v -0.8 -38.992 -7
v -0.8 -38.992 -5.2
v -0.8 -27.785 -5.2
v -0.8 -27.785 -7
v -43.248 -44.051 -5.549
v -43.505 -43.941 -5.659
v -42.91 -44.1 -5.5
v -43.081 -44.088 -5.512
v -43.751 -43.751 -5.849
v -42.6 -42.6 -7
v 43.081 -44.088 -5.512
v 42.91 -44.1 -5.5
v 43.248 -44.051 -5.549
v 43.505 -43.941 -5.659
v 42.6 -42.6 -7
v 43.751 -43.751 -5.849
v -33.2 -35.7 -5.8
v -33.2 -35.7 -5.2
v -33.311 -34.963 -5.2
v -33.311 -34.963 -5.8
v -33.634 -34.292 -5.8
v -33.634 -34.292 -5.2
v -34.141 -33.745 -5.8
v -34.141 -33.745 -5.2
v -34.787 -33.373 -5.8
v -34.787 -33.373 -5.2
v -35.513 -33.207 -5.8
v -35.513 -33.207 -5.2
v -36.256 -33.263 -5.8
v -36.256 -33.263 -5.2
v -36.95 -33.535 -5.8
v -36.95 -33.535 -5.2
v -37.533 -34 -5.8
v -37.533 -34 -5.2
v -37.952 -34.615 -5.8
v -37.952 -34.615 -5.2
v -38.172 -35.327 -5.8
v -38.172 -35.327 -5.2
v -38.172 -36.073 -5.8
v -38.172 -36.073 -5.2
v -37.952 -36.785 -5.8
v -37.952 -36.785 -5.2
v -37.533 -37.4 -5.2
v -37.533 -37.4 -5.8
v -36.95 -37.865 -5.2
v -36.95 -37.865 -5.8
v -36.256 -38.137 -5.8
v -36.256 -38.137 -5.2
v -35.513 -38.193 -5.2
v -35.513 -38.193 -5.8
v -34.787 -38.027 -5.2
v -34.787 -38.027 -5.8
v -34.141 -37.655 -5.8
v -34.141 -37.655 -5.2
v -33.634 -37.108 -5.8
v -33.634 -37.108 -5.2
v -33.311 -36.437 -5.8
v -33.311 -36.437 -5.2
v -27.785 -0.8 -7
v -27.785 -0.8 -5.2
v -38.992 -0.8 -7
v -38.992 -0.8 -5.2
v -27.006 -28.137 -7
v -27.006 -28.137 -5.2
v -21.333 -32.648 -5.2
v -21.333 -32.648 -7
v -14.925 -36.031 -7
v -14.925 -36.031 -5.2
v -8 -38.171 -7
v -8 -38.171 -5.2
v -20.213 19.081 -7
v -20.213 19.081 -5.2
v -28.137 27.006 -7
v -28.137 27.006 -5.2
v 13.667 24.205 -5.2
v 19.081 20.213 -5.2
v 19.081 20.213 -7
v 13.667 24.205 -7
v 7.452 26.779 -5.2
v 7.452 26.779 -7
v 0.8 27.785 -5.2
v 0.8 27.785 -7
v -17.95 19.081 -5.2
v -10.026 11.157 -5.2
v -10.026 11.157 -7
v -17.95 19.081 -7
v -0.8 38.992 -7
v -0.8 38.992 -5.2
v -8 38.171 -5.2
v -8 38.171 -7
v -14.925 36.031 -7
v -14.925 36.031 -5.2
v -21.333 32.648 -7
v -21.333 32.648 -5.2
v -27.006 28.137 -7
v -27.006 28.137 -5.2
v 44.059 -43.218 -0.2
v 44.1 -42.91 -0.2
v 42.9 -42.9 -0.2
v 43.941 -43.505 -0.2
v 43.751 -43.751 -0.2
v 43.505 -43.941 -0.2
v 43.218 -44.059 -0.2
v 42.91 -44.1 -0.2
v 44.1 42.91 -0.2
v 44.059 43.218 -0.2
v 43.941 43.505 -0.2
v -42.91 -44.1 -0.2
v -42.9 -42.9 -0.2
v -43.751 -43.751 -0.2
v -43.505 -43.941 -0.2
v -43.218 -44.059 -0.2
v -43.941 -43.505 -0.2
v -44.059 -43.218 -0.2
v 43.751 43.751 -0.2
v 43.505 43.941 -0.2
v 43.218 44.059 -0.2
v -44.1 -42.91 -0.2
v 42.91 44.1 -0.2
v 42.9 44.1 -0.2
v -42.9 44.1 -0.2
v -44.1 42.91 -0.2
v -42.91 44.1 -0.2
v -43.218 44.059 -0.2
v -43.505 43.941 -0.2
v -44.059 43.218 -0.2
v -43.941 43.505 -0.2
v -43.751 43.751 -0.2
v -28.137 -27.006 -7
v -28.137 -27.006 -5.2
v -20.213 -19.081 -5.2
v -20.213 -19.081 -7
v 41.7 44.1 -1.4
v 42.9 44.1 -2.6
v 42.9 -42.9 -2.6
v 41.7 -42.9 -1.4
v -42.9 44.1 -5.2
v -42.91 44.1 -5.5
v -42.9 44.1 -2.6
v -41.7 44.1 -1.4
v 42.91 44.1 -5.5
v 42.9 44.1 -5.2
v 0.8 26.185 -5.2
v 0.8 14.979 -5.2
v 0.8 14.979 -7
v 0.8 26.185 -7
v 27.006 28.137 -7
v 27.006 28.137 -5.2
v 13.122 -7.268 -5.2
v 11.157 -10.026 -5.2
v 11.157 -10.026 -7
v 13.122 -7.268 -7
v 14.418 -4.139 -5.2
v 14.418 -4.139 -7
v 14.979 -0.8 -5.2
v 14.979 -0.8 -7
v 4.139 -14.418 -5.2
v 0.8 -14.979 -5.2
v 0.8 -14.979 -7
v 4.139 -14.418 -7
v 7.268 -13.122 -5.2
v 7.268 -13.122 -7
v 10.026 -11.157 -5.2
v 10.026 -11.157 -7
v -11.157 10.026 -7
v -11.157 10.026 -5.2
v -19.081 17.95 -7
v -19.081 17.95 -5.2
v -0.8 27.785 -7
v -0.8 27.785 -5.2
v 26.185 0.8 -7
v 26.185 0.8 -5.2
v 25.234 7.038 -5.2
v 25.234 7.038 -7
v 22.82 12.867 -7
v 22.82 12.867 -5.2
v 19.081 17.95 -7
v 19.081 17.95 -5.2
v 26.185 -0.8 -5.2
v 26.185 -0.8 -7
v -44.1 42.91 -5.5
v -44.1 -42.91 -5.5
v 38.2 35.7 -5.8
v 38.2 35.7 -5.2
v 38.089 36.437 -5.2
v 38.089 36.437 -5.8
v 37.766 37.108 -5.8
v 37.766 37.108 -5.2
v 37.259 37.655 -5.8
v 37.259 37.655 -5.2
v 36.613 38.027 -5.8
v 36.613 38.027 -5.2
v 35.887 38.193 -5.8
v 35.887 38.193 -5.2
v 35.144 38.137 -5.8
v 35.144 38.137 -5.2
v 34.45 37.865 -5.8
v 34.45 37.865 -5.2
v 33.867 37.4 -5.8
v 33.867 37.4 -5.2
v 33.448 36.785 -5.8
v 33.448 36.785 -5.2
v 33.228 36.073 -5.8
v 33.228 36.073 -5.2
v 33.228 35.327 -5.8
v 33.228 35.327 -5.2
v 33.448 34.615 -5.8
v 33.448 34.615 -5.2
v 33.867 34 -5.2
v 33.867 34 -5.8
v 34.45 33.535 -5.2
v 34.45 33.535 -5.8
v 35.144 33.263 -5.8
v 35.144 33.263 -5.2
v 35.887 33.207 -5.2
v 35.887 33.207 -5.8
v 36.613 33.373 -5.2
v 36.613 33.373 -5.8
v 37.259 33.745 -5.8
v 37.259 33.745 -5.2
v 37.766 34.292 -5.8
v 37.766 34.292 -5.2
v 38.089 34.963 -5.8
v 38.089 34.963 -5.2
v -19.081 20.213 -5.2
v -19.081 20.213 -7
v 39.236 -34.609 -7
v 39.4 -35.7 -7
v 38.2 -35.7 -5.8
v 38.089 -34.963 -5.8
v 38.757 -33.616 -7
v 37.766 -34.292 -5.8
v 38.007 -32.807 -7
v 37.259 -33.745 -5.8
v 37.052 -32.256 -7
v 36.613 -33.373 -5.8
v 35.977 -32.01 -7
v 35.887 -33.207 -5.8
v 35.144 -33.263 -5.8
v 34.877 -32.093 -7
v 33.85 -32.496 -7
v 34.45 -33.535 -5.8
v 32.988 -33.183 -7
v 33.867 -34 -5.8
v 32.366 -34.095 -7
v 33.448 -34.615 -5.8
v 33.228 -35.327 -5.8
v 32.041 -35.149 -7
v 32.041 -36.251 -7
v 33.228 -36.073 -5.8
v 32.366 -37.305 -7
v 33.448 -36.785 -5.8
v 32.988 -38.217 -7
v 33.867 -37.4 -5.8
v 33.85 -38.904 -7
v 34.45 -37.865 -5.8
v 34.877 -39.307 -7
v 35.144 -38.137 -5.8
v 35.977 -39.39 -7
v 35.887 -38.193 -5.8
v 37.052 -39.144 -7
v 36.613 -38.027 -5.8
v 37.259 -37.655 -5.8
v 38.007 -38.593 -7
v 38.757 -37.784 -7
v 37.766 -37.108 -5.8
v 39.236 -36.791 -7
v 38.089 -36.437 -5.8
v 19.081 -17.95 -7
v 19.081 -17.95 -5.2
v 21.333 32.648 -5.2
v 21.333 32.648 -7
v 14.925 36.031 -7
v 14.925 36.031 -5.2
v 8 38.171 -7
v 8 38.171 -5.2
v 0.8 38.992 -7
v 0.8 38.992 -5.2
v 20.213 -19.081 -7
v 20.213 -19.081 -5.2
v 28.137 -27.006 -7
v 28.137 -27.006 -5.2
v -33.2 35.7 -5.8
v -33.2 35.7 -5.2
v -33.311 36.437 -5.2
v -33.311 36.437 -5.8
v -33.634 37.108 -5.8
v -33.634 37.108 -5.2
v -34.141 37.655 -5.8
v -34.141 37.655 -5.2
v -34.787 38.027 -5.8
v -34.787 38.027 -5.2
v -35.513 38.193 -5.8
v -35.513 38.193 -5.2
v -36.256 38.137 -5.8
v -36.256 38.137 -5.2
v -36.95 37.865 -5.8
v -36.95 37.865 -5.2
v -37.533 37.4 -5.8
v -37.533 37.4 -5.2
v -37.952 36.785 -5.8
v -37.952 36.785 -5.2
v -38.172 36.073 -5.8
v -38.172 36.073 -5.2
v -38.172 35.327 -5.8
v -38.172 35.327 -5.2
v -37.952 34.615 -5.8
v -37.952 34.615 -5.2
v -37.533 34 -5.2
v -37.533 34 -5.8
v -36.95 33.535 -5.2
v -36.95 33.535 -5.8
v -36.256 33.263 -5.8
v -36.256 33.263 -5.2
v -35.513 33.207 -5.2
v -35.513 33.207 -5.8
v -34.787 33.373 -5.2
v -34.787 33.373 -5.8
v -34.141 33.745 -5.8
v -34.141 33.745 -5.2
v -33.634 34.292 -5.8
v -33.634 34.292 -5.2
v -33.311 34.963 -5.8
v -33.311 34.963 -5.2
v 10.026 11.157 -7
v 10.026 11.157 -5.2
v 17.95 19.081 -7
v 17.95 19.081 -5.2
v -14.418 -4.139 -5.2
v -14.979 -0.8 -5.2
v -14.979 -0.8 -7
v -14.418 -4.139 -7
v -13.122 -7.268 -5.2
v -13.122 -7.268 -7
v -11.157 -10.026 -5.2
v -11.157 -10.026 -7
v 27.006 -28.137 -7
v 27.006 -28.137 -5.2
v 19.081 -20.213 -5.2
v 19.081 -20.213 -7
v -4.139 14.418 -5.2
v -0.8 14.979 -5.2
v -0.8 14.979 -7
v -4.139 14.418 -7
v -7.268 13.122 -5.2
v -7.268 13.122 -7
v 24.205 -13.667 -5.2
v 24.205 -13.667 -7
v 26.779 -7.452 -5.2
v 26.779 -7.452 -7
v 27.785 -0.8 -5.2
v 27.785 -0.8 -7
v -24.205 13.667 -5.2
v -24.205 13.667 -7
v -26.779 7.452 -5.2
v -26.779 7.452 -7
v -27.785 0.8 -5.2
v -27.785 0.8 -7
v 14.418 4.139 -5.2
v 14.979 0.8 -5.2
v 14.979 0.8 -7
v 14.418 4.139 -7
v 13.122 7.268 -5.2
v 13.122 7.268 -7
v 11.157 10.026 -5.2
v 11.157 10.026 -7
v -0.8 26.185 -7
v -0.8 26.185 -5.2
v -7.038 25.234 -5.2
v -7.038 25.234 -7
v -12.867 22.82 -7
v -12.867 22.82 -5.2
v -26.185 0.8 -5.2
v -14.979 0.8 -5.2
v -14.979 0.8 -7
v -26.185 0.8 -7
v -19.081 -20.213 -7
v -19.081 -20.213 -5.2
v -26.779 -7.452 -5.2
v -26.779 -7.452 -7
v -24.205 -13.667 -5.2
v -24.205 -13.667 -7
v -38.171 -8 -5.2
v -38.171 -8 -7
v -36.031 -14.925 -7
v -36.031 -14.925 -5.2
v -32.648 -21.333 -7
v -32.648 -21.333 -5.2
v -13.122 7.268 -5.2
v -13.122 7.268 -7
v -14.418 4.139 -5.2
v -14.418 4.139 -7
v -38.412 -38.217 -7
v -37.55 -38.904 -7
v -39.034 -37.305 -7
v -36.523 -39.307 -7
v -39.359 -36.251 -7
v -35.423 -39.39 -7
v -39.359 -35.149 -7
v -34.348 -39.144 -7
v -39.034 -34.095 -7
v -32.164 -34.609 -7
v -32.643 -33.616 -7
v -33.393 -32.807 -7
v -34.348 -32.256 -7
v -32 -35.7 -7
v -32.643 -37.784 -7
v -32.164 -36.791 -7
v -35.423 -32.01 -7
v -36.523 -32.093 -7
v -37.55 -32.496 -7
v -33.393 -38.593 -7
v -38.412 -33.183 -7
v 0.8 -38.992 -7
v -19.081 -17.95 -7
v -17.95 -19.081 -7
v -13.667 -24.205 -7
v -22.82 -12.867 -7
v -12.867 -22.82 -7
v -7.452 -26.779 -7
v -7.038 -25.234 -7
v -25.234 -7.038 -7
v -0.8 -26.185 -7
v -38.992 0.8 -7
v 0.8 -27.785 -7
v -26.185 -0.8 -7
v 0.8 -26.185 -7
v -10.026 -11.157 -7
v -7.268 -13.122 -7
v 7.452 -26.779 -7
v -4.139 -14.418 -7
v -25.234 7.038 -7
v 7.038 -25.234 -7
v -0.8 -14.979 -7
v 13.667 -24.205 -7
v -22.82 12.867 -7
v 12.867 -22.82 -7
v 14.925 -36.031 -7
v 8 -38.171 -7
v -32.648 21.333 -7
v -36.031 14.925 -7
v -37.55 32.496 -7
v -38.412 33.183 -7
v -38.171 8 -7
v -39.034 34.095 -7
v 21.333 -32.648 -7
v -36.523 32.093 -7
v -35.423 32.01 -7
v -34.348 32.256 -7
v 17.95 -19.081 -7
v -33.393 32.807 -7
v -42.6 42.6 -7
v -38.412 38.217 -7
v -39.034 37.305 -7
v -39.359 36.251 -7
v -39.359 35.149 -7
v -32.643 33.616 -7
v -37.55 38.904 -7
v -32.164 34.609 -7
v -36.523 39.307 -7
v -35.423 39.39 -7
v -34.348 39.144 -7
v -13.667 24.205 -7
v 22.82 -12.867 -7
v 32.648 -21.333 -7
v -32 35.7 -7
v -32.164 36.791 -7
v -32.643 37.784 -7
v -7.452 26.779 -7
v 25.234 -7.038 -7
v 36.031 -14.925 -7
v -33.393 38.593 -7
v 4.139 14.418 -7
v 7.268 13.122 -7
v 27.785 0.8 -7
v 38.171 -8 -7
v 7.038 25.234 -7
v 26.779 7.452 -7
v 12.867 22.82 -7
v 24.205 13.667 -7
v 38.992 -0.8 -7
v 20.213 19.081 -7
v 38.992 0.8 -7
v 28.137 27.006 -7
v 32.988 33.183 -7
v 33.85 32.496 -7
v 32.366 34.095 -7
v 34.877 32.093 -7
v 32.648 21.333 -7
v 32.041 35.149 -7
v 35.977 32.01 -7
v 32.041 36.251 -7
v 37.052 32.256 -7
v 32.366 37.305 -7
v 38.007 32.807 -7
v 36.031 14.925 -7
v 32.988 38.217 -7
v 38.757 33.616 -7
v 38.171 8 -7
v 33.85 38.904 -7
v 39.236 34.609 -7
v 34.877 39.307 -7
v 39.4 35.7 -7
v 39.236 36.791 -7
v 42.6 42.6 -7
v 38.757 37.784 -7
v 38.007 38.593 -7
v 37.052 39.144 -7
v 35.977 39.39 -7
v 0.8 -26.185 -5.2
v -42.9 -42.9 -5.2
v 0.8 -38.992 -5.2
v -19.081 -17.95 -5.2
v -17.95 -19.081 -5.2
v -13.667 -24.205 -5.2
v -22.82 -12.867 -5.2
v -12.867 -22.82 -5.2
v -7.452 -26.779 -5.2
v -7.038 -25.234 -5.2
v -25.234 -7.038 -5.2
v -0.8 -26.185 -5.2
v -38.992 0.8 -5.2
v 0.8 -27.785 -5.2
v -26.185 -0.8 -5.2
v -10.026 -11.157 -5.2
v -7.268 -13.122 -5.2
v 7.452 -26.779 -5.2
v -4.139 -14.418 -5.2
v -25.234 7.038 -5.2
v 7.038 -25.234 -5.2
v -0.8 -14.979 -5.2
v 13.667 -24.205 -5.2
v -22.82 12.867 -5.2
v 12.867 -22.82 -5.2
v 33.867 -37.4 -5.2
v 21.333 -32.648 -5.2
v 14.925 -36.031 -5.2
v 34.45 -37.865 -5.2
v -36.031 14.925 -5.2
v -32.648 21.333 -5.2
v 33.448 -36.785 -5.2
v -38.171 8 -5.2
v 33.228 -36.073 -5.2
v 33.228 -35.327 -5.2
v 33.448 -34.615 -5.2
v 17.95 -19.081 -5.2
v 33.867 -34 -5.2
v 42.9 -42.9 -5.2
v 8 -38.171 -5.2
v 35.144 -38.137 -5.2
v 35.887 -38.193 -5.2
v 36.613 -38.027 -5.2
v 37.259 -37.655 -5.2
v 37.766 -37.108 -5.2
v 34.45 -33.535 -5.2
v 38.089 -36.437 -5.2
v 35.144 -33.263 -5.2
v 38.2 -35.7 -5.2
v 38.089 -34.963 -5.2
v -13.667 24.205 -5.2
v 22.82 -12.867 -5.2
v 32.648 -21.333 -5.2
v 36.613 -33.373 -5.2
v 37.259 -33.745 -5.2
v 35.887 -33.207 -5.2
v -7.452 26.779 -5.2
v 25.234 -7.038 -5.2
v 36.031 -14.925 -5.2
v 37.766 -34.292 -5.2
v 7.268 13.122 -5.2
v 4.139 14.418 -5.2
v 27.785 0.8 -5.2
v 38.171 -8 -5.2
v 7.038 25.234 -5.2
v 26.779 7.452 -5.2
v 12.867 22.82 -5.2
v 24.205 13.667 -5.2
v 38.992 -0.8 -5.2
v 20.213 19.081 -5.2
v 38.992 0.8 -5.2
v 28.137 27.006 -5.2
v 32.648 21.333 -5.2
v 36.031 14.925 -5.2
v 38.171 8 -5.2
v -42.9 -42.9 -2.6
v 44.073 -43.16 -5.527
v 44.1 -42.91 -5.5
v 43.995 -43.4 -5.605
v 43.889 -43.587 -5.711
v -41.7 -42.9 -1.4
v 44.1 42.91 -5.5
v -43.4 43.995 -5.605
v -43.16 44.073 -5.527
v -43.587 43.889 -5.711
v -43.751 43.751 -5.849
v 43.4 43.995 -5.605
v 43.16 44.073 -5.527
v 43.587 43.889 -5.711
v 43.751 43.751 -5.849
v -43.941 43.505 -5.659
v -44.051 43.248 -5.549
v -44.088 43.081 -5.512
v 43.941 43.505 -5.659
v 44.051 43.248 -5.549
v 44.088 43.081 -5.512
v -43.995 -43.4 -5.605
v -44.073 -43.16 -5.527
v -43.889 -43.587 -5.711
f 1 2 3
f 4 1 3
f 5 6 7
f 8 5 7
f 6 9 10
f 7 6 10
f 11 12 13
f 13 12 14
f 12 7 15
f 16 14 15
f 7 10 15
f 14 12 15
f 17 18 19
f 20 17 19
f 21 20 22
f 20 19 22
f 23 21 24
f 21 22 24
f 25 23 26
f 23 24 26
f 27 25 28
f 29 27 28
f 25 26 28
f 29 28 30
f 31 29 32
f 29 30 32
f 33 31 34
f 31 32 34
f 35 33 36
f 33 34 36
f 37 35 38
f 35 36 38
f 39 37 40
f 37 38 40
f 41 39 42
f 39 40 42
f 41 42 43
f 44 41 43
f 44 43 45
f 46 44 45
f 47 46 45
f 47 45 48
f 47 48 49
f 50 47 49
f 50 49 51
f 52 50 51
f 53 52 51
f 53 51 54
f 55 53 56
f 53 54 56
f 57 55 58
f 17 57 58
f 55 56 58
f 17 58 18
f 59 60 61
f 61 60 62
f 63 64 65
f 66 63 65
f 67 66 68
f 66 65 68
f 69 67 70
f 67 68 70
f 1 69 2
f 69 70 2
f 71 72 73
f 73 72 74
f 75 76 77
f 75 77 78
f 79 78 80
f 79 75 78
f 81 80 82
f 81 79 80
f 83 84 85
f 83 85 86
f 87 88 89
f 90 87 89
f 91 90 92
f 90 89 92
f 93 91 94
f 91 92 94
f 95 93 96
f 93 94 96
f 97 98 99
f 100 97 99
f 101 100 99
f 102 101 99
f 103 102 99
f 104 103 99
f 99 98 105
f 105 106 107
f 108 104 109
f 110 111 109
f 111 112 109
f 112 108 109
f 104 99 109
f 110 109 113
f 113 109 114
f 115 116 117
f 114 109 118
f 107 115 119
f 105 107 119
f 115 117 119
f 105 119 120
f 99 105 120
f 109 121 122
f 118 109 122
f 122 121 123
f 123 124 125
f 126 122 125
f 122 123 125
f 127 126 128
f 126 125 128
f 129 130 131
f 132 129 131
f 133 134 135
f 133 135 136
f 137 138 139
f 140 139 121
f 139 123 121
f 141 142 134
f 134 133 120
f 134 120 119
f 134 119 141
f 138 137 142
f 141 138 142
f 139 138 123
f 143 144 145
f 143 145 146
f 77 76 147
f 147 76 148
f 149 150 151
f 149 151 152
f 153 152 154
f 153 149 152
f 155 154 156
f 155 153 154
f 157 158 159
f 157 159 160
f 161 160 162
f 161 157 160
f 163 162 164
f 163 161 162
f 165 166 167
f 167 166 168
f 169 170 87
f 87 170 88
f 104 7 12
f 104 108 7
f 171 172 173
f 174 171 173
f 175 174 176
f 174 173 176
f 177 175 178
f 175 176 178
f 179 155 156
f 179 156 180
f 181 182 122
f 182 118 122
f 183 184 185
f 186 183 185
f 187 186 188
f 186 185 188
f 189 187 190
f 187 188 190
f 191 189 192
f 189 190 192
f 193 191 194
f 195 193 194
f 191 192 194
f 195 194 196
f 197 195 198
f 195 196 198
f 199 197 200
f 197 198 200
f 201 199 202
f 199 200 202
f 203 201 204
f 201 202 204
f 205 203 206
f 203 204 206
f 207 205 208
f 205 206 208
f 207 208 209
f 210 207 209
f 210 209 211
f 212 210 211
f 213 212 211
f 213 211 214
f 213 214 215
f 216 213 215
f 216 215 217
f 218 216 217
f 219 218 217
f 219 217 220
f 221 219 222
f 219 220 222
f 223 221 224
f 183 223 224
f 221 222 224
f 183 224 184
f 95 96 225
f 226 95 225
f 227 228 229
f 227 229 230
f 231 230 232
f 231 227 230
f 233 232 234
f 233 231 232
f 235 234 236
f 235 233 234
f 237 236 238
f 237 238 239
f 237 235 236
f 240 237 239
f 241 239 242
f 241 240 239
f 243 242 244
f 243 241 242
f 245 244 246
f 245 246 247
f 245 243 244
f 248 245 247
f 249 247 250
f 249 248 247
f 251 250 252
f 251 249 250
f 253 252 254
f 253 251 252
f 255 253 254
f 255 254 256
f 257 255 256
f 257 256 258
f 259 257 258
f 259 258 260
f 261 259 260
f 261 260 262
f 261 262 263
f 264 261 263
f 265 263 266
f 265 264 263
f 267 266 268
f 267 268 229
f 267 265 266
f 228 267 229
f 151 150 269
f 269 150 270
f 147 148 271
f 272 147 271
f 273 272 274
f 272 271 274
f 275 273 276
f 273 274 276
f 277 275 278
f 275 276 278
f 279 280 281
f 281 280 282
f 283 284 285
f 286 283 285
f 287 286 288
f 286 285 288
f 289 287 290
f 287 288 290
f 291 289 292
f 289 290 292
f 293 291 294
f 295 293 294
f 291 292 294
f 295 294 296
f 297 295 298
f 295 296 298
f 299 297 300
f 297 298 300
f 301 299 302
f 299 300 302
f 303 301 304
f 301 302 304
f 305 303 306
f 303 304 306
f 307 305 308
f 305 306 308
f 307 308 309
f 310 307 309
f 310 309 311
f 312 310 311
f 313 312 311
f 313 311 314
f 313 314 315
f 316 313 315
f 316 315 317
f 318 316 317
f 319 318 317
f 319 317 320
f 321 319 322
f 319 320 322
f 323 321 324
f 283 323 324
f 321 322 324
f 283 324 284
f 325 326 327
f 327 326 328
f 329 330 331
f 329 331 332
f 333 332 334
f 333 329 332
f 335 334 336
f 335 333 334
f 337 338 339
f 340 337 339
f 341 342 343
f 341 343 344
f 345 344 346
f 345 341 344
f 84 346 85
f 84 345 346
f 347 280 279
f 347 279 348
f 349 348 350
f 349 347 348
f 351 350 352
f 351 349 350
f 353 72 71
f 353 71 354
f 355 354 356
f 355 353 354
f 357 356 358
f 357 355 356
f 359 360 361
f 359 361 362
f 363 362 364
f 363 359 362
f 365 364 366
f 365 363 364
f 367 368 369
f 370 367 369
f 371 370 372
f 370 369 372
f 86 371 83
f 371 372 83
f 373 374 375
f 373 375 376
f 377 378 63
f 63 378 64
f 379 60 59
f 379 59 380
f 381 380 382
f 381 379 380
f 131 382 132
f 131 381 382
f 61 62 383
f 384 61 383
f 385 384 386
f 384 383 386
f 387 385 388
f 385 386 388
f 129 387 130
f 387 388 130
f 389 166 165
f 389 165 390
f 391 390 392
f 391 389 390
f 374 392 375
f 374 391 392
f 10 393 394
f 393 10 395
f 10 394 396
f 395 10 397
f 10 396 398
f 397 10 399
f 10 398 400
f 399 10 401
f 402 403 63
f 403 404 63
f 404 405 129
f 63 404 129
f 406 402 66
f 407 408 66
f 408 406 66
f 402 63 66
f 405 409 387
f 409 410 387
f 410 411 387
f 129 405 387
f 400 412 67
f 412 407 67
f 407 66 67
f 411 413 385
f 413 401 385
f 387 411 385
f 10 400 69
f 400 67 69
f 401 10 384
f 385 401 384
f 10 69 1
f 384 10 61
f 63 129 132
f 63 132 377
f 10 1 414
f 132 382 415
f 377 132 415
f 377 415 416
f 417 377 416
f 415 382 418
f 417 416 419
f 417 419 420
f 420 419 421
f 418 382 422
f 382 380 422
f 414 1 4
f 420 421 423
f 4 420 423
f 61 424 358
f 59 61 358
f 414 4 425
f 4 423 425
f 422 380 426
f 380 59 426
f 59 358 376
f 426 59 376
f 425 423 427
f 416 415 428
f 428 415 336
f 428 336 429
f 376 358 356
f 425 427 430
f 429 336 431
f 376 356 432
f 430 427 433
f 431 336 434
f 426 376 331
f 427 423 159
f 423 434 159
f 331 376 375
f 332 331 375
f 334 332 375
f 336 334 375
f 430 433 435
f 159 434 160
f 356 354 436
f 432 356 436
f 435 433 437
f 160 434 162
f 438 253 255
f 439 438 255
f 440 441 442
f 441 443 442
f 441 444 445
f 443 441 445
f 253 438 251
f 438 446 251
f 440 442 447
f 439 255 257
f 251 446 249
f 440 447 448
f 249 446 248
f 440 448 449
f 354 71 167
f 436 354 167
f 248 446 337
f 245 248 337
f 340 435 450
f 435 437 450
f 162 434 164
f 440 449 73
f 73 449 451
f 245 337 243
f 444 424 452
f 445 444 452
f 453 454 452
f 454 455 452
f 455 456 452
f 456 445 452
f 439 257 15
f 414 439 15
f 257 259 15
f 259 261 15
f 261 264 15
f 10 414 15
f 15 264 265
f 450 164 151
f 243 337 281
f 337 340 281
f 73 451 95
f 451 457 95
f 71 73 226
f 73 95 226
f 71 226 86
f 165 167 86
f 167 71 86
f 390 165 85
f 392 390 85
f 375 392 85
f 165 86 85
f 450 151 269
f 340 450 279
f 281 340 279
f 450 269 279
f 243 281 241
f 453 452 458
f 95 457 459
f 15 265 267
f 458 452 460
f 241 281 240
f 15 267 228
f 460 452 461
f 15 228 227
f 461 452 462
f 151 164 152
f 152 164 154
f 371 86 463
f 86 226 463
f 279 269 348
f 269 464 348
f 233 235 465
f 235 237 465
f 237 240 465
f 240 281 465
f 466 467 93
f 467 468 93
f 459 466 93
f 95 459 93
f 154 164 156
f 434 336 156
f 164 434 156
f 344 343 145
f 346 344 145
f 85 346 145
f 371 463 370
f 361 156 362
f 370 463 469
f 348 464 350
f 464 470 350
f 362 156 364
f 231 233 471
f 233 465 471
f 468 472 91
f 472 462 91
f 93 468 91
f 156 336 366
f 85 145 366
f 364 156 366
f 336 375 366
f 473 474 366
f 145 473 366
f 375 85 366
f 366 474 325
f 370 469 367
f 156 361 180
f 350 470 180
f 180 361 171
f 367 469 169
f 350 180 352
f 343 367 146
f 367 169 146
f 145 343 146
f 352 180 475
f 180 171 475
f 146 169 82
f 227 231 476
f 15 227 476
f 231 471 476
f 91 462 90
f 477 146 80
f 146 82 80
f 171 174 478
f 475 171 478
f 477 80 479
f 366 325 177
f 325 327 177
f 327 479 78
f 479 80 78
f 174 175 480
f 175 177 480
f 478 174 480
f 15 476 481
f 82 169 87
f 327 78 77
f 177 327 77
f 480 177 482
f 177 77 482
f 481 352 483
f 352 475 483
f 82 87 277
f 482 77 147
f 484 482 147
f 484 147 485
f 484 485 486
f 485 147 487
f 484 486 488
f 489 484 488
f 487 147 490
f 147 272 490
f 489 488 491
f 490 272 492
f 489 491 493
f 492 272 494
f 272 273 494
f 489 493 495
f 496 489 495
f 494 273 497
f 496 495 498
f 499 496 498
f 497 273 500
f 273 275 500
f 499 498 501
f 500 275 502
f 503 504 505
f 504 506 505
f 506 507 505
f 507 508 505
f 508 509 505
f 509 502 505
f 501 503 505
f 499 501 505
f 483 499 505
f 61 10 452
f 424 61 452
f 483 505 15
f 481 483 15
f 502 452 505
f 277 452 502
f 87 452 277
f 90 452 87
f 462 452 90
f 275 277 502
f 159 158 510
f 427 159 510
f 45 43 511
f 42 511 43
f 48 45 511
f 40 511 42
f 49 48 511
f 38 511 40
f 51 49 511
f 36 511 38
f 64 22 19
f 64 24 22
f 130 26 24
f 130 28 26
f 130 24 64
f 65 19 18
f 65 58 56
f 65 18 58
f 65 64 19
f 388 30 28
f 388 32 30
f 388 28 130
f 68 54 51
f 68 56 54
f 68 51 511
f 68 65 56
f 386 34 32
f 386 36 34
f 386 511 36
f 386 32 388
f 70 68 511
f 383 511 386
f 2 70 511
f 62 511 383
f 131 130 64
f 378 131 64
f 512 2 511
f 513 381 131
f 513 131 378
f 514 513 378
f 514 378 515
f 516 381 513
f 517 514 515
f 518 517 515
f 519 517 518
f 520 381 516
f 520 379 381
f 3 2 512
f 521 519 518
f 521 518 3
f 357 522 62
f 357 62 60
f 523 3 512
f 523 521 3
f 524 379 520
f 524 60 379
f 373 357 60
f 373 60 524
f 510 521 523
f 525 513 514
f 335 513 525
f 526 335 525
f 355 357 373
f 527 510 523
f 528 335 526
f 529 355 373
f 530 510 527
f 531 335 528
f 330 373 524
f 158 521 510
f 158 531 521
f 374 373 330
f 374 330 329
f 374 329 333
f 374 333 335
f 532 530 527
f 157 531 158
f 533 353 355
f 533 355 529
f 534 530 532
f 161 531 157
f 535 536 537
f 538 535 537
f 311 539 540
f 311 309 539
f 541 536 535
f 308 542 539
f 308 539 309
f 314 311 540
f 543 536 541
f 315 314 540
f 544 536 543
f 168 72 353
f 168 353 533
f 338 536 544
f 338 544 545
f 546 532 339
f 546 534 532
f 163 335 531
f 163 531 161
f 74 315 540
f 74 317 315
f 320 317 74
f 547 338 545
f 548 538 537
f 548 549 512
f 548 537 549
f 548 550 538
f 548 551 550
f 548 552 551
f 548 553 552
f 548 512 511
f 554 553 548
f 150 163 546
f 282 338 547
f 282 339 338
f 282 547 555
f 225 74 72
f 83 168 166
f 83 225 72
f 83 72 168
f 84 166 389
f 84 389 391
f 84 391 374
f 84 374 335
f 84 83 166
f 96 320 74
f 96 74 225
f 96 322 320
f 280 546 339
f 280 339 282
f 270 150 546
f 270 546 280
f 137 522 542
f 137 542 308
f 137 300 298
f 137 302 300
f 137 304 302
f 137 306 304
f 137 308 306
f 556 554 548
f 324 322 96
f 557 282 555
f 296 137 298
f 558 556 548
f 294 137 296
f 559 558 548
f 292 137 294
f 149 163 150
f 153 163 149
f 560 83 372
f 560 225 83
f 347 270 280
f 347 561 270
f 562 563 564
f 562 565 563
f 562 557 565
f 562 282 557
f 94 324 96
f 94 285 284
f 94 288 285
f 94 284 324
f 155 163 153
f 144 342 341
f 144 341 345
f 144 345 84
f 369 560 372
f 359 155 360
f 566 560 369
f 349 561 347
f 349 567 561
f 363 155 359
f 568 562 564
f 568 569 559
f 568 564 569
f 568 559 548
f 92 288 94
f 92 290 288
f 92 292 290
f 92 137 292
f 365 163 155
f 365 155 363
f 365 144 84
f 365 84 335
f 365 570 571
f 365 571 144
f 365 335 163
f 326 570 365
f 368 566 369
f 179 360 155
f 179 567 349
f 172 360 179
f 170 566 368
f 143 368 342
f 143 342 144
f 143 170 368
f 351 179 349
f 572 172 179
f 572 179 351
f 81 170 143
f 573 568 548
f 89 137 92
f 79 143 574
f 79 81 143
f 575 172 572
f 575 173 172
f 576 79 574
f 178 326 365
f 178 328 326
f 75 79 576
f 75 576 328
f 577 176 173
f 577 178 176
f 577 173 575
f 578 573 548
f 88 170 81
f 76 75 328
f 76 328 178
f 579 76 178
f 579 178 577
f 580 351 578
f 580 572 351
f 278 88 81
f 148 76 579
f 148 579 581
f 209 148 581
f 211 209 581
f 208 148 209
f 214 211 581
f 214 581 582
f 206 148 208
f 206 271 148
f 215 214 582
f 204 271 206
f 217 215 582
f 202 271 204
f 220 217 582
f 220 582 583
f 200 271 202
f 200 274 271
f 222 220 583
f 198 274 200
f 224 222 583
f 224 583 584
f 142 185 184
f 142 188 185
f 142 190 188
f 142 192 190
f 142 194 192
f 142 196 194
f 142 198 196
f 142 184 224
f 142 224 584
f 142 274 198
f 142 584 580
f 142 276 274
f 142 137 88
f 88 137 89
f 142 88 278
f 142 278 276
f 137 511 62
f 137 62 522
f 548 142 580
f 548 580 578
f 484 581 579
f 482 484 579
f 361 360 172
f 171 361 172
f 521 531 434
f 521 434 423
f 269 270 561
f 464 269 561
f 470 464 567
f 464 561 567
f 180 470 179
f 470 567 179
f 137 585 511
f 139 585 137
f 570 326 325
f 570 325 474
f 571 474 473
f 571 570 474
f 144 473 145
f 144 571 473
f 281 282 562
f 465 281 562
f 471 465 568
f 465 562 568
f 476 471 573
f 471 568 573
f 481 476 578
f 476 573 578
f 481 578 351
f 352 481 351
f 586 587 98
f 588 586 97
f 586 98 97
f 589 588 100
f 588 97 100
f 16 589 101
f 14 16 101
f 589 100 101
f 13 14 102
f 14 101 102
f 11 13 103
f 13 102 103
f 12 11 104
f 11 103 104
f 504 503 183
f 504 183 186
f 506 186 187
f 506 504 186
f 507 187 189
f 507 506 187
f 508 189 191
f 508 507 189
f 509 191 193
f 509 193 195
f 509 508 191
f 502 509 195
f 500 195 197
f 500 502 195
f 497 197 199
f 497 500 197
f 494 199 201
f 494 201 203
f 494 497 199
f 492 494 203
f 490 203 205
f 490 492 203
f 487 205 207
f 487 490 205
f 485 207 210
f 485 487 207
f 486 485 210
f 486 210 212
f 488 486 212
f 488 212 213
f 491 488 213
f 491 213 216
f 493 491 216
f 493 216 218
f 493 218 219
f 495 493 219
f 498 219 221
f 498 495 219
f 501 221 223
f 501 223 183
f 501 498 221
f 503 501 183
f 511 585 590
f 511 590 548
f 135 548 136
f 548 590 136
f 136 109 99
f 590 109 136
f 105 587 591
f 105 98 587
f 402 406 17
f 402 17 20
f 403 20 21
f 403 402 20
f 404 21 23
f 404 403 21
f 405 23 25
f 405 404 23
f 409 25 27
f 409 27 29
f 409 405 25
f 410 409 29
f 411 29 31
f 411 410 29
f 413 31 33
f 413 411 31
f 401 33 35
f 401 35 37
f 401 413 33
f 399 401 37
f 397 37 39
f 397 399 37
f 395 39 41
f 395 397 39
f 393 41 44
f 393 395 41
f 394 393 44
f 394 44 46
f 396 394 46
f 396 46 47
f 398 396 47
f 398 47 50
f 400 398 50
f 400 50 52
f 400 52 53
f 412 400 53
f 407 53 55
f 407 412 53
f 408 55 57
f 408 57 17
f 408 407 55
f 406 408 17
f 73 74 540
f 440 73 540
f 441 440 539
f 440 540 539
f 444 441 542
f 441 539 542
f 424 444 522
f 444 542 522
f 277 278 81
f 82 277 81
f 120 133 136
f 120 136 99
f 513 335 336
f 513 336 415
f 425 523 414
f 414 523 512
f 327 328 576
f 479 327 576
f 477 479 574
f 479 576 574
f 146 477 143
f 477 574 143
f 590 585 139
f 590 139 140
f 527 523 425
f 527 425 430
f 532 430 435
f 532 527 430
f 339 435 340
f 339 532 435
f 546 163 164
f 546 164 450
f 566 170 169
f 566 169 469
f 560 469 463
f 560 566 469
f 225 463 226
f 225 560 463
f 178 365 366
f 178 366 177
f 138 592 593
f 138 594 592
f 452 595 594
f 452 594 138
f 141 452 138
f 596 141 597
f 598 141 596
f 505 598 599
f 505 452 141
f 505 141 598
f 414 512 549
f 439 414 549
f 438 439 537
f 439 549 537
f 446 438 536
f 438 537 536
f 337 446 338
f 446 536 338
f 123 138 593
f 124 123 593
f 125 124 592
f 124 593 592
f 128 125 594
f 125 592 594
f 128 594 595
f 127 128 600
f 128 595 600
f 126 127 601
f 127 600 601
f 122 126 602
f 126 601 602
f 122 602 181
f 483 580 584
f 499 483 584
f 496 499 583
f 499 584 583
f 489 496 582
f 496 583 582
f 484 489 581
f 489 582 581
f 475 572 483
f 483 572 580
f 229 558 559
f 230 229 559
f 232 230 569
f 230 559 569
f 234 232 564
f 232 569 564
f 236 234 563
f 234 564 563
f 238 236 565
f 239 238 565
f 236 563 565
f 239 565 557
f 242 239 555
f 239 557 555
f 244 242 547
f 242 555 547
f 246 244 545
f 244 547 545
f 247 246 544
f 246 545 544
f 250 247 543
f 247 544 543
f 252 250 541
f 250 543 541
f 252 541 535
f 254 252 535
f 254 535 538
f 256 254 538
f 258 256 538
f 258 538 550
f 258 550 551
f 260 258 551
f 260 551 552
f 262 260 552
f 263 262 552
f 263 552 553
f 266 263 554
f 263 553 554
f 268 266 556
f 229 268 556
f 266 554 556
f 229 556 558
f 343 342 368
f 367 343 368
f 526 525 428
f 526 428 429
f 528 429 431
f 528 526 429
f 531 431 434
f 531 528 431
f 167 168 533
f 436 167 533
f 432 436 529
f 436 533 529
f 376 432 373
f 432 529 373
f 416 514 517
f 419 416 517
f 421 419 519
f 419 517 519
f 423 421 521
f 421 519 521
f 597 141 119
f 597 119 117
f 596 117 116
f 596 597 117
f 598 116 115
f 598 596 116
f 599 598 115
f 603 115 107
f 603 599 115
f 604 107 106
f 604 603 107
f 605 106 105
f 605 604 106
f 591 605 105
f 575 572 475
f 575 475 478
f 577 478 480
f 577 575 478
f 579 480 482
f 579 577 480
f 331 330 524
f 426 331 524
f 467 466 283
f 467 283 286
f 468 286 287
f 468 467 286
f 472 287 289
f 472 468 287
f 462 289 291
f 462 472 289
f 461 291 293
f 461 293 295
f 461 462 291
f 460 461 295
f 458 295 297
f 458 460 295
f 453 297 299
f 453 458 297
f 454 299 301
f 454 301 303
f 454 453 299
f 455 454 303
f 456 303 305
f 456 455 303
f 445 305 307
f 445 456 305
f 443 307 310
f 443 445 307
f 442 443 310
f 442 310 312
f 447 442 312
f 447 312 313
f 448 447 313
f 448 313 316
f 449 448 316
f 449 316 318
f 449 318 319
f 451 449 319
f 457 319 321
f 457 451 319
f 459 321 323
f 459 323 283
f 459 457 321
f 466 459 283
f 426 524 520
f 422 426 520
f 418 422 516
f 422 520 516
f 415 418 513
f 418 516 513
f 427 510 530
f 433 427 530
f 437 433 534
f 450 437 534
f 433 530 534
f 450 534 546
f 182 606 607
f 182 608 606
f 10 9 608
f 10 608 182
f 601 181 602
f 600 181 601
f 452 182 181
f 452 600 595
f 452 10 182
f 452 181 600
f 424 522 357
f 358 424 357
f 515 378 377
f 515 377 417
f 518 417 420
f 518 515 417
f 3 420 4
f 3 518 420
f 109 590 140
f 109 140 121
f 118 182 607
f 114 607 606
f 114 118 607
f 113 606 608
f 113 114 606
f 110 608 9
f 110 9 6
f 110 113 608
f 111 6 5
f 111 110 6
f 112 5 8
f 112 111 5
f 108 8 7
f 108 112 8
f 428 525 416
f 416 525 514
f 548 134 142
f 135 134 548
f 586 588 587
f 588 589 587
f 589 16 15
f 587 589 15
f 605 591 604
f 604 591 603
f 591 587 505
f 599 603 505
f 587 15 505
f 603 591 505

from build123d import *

# Parameters (mm, degrees)
PAD008_DEPTH          = 5
SKETCH022_W           = 88.2
SKETCH022_H           = 88.2
SKETCH022_R           = 2.5
PAD009_DEPTH          = 1.8
CHAMFER004_SIZE       = 1.2
PAD010_DEPTH          = 44.1
POCKET006_DEPTH       = 256.838707
POLARPATTERN002_COUNT = 8
CHAMFER005_SIZE       = 1.5
FILLET003_R           = 1.19


with BuildPart() as part:
    # Sketch021 → Pad008 (new body)
    with BuildSketch(Plane.XY.offset(-0.2)):
        Polygon((-42.9, 42.9), (-42.9, -42.9), (42.9, -42.9), (42.9, 42.9), (42.9, 44.1), (44.1, 44.1), (44.1, -44.1), (-44.1, -44.1), (-44.1, 44.1), (-42.9, 44.1), align=None)
    extrude(amount=-PAD008_DEPTH)

    # Sketch022 → Pad009 (join)
    with BuildSketch(Plane.XY.offset(-5.2)):
        Rectangle(SKETCH022_W, SKETCH022_H)
        with Locations((-35.7, 35.7)):
            Circle(SKETCH022_R, mode=Mode.SUBTRACT)
        with Locations((35.7, 35.7)):
            Circle(SKETCH022_R, mode=Mode.SUBTRACT)
        with Locations((35.7, -35.7)):
            Circle(SKETCH022_R, mode=Mode.SUBTRACT)
        with Locations((-35.7, -35.7)):
            Circle(SKETCH022_R, mode=Mode.SUBTRACT)
    extrude(amount=-PAD009_DEPTH)

    # Chamfer004
    chamfer004_edges = [part.edges().sort_by_distance(p)[0] for p in [
        (-38.2, 35.7, -7),
        (-38.2, -35.7, -7),
        (33.2, -35.7, -7),
        (33.2, 35.7, -7),
    ]]
    chamfer(chamfer004_edges, length=CHAMFER004_SIZE)

    # Sketch023 → Pad010 (join, symmetric)
    with BuildSketch(Plane.XZ):
        Polygon((42.9, -0.2), (42.9, -2.6), (41.7, -1.4), align=None)
        Polygon((-42.9, -0.2), (-42.9, -2.6), (-41.7, -1.4), align=None)
    extrude(amount=PAD010_DEPTH, both=True)

    # Sketch024 → Pocket006 (cut, through all)
    with BuildSketch(Plane.XY):
        with BuildLine():
            ThreePointArc((27.005677, 28.137047), (14.924654, 36.031302), (0.8, 38.991794))
            Line((0.8, 38.991794), (0.8, 27.785223))
            ThreePointArc((19.081434, 20.212805), (10.637351, 25.680837), (0.8, 27.785223))
            Line((19.081434, 20.212805), (27.005677, 28.137047))
        make_face()
        with BuildLine():
            ThreePointArc((17.950063, 19.081434), (10.025326, 24.203279), (0.8, 26.185223))
            Line((0.8, 14.978651), (0.8, 26.185223))
            ThreePointArc((10.025821, 11.157191), (5.740251, 13.858193), (0.8, 14.978651))
            Line((10.025821, 11.157191), (17.950063, 19.081434))
        make_face()
    pocket006 = extrude(amount=-POCKET006_DEPTH, mode=Mode.SUBTRACT)

    # PolarPattern002: Pocket006 ×8 about axis
    polarpattern002_axis = Axis((0, 0, 0), (0, 0, 1))
    for i in range(1, POLARPATTERN002_COUNT):
        add(pocket006.rotate(polarpattern002_axis, i * 360 / POLARPATTERN002_COUNT), mode=Mode.SUBTRACT)

    # Chamfer005
    chamfer005_edges = [part.edges().sort_by_distance(p)[0] for p in [
        (-44.1, 0, -7),
        (0, -44.1, -7),
        (44.1, 0, -7),
        (0, 44.1, -7),
    ]]
    chamfer(chamfer005_edges, length=CHAMFER005_SIZE)

    # Fillet003
    fillet003_edges = [part.edges().sort_by_distance(p)[0] for p in [
        (-44.1, 44.1, -2.85),
        (-44.1, -44.1, -2.85),
        (44.1, 44.1, -2.85),
        (44.1, -44.1, -2.85),
    ]]
    fillet(fillet003_edges, radius=FILLET003_R)


solid = part.part
